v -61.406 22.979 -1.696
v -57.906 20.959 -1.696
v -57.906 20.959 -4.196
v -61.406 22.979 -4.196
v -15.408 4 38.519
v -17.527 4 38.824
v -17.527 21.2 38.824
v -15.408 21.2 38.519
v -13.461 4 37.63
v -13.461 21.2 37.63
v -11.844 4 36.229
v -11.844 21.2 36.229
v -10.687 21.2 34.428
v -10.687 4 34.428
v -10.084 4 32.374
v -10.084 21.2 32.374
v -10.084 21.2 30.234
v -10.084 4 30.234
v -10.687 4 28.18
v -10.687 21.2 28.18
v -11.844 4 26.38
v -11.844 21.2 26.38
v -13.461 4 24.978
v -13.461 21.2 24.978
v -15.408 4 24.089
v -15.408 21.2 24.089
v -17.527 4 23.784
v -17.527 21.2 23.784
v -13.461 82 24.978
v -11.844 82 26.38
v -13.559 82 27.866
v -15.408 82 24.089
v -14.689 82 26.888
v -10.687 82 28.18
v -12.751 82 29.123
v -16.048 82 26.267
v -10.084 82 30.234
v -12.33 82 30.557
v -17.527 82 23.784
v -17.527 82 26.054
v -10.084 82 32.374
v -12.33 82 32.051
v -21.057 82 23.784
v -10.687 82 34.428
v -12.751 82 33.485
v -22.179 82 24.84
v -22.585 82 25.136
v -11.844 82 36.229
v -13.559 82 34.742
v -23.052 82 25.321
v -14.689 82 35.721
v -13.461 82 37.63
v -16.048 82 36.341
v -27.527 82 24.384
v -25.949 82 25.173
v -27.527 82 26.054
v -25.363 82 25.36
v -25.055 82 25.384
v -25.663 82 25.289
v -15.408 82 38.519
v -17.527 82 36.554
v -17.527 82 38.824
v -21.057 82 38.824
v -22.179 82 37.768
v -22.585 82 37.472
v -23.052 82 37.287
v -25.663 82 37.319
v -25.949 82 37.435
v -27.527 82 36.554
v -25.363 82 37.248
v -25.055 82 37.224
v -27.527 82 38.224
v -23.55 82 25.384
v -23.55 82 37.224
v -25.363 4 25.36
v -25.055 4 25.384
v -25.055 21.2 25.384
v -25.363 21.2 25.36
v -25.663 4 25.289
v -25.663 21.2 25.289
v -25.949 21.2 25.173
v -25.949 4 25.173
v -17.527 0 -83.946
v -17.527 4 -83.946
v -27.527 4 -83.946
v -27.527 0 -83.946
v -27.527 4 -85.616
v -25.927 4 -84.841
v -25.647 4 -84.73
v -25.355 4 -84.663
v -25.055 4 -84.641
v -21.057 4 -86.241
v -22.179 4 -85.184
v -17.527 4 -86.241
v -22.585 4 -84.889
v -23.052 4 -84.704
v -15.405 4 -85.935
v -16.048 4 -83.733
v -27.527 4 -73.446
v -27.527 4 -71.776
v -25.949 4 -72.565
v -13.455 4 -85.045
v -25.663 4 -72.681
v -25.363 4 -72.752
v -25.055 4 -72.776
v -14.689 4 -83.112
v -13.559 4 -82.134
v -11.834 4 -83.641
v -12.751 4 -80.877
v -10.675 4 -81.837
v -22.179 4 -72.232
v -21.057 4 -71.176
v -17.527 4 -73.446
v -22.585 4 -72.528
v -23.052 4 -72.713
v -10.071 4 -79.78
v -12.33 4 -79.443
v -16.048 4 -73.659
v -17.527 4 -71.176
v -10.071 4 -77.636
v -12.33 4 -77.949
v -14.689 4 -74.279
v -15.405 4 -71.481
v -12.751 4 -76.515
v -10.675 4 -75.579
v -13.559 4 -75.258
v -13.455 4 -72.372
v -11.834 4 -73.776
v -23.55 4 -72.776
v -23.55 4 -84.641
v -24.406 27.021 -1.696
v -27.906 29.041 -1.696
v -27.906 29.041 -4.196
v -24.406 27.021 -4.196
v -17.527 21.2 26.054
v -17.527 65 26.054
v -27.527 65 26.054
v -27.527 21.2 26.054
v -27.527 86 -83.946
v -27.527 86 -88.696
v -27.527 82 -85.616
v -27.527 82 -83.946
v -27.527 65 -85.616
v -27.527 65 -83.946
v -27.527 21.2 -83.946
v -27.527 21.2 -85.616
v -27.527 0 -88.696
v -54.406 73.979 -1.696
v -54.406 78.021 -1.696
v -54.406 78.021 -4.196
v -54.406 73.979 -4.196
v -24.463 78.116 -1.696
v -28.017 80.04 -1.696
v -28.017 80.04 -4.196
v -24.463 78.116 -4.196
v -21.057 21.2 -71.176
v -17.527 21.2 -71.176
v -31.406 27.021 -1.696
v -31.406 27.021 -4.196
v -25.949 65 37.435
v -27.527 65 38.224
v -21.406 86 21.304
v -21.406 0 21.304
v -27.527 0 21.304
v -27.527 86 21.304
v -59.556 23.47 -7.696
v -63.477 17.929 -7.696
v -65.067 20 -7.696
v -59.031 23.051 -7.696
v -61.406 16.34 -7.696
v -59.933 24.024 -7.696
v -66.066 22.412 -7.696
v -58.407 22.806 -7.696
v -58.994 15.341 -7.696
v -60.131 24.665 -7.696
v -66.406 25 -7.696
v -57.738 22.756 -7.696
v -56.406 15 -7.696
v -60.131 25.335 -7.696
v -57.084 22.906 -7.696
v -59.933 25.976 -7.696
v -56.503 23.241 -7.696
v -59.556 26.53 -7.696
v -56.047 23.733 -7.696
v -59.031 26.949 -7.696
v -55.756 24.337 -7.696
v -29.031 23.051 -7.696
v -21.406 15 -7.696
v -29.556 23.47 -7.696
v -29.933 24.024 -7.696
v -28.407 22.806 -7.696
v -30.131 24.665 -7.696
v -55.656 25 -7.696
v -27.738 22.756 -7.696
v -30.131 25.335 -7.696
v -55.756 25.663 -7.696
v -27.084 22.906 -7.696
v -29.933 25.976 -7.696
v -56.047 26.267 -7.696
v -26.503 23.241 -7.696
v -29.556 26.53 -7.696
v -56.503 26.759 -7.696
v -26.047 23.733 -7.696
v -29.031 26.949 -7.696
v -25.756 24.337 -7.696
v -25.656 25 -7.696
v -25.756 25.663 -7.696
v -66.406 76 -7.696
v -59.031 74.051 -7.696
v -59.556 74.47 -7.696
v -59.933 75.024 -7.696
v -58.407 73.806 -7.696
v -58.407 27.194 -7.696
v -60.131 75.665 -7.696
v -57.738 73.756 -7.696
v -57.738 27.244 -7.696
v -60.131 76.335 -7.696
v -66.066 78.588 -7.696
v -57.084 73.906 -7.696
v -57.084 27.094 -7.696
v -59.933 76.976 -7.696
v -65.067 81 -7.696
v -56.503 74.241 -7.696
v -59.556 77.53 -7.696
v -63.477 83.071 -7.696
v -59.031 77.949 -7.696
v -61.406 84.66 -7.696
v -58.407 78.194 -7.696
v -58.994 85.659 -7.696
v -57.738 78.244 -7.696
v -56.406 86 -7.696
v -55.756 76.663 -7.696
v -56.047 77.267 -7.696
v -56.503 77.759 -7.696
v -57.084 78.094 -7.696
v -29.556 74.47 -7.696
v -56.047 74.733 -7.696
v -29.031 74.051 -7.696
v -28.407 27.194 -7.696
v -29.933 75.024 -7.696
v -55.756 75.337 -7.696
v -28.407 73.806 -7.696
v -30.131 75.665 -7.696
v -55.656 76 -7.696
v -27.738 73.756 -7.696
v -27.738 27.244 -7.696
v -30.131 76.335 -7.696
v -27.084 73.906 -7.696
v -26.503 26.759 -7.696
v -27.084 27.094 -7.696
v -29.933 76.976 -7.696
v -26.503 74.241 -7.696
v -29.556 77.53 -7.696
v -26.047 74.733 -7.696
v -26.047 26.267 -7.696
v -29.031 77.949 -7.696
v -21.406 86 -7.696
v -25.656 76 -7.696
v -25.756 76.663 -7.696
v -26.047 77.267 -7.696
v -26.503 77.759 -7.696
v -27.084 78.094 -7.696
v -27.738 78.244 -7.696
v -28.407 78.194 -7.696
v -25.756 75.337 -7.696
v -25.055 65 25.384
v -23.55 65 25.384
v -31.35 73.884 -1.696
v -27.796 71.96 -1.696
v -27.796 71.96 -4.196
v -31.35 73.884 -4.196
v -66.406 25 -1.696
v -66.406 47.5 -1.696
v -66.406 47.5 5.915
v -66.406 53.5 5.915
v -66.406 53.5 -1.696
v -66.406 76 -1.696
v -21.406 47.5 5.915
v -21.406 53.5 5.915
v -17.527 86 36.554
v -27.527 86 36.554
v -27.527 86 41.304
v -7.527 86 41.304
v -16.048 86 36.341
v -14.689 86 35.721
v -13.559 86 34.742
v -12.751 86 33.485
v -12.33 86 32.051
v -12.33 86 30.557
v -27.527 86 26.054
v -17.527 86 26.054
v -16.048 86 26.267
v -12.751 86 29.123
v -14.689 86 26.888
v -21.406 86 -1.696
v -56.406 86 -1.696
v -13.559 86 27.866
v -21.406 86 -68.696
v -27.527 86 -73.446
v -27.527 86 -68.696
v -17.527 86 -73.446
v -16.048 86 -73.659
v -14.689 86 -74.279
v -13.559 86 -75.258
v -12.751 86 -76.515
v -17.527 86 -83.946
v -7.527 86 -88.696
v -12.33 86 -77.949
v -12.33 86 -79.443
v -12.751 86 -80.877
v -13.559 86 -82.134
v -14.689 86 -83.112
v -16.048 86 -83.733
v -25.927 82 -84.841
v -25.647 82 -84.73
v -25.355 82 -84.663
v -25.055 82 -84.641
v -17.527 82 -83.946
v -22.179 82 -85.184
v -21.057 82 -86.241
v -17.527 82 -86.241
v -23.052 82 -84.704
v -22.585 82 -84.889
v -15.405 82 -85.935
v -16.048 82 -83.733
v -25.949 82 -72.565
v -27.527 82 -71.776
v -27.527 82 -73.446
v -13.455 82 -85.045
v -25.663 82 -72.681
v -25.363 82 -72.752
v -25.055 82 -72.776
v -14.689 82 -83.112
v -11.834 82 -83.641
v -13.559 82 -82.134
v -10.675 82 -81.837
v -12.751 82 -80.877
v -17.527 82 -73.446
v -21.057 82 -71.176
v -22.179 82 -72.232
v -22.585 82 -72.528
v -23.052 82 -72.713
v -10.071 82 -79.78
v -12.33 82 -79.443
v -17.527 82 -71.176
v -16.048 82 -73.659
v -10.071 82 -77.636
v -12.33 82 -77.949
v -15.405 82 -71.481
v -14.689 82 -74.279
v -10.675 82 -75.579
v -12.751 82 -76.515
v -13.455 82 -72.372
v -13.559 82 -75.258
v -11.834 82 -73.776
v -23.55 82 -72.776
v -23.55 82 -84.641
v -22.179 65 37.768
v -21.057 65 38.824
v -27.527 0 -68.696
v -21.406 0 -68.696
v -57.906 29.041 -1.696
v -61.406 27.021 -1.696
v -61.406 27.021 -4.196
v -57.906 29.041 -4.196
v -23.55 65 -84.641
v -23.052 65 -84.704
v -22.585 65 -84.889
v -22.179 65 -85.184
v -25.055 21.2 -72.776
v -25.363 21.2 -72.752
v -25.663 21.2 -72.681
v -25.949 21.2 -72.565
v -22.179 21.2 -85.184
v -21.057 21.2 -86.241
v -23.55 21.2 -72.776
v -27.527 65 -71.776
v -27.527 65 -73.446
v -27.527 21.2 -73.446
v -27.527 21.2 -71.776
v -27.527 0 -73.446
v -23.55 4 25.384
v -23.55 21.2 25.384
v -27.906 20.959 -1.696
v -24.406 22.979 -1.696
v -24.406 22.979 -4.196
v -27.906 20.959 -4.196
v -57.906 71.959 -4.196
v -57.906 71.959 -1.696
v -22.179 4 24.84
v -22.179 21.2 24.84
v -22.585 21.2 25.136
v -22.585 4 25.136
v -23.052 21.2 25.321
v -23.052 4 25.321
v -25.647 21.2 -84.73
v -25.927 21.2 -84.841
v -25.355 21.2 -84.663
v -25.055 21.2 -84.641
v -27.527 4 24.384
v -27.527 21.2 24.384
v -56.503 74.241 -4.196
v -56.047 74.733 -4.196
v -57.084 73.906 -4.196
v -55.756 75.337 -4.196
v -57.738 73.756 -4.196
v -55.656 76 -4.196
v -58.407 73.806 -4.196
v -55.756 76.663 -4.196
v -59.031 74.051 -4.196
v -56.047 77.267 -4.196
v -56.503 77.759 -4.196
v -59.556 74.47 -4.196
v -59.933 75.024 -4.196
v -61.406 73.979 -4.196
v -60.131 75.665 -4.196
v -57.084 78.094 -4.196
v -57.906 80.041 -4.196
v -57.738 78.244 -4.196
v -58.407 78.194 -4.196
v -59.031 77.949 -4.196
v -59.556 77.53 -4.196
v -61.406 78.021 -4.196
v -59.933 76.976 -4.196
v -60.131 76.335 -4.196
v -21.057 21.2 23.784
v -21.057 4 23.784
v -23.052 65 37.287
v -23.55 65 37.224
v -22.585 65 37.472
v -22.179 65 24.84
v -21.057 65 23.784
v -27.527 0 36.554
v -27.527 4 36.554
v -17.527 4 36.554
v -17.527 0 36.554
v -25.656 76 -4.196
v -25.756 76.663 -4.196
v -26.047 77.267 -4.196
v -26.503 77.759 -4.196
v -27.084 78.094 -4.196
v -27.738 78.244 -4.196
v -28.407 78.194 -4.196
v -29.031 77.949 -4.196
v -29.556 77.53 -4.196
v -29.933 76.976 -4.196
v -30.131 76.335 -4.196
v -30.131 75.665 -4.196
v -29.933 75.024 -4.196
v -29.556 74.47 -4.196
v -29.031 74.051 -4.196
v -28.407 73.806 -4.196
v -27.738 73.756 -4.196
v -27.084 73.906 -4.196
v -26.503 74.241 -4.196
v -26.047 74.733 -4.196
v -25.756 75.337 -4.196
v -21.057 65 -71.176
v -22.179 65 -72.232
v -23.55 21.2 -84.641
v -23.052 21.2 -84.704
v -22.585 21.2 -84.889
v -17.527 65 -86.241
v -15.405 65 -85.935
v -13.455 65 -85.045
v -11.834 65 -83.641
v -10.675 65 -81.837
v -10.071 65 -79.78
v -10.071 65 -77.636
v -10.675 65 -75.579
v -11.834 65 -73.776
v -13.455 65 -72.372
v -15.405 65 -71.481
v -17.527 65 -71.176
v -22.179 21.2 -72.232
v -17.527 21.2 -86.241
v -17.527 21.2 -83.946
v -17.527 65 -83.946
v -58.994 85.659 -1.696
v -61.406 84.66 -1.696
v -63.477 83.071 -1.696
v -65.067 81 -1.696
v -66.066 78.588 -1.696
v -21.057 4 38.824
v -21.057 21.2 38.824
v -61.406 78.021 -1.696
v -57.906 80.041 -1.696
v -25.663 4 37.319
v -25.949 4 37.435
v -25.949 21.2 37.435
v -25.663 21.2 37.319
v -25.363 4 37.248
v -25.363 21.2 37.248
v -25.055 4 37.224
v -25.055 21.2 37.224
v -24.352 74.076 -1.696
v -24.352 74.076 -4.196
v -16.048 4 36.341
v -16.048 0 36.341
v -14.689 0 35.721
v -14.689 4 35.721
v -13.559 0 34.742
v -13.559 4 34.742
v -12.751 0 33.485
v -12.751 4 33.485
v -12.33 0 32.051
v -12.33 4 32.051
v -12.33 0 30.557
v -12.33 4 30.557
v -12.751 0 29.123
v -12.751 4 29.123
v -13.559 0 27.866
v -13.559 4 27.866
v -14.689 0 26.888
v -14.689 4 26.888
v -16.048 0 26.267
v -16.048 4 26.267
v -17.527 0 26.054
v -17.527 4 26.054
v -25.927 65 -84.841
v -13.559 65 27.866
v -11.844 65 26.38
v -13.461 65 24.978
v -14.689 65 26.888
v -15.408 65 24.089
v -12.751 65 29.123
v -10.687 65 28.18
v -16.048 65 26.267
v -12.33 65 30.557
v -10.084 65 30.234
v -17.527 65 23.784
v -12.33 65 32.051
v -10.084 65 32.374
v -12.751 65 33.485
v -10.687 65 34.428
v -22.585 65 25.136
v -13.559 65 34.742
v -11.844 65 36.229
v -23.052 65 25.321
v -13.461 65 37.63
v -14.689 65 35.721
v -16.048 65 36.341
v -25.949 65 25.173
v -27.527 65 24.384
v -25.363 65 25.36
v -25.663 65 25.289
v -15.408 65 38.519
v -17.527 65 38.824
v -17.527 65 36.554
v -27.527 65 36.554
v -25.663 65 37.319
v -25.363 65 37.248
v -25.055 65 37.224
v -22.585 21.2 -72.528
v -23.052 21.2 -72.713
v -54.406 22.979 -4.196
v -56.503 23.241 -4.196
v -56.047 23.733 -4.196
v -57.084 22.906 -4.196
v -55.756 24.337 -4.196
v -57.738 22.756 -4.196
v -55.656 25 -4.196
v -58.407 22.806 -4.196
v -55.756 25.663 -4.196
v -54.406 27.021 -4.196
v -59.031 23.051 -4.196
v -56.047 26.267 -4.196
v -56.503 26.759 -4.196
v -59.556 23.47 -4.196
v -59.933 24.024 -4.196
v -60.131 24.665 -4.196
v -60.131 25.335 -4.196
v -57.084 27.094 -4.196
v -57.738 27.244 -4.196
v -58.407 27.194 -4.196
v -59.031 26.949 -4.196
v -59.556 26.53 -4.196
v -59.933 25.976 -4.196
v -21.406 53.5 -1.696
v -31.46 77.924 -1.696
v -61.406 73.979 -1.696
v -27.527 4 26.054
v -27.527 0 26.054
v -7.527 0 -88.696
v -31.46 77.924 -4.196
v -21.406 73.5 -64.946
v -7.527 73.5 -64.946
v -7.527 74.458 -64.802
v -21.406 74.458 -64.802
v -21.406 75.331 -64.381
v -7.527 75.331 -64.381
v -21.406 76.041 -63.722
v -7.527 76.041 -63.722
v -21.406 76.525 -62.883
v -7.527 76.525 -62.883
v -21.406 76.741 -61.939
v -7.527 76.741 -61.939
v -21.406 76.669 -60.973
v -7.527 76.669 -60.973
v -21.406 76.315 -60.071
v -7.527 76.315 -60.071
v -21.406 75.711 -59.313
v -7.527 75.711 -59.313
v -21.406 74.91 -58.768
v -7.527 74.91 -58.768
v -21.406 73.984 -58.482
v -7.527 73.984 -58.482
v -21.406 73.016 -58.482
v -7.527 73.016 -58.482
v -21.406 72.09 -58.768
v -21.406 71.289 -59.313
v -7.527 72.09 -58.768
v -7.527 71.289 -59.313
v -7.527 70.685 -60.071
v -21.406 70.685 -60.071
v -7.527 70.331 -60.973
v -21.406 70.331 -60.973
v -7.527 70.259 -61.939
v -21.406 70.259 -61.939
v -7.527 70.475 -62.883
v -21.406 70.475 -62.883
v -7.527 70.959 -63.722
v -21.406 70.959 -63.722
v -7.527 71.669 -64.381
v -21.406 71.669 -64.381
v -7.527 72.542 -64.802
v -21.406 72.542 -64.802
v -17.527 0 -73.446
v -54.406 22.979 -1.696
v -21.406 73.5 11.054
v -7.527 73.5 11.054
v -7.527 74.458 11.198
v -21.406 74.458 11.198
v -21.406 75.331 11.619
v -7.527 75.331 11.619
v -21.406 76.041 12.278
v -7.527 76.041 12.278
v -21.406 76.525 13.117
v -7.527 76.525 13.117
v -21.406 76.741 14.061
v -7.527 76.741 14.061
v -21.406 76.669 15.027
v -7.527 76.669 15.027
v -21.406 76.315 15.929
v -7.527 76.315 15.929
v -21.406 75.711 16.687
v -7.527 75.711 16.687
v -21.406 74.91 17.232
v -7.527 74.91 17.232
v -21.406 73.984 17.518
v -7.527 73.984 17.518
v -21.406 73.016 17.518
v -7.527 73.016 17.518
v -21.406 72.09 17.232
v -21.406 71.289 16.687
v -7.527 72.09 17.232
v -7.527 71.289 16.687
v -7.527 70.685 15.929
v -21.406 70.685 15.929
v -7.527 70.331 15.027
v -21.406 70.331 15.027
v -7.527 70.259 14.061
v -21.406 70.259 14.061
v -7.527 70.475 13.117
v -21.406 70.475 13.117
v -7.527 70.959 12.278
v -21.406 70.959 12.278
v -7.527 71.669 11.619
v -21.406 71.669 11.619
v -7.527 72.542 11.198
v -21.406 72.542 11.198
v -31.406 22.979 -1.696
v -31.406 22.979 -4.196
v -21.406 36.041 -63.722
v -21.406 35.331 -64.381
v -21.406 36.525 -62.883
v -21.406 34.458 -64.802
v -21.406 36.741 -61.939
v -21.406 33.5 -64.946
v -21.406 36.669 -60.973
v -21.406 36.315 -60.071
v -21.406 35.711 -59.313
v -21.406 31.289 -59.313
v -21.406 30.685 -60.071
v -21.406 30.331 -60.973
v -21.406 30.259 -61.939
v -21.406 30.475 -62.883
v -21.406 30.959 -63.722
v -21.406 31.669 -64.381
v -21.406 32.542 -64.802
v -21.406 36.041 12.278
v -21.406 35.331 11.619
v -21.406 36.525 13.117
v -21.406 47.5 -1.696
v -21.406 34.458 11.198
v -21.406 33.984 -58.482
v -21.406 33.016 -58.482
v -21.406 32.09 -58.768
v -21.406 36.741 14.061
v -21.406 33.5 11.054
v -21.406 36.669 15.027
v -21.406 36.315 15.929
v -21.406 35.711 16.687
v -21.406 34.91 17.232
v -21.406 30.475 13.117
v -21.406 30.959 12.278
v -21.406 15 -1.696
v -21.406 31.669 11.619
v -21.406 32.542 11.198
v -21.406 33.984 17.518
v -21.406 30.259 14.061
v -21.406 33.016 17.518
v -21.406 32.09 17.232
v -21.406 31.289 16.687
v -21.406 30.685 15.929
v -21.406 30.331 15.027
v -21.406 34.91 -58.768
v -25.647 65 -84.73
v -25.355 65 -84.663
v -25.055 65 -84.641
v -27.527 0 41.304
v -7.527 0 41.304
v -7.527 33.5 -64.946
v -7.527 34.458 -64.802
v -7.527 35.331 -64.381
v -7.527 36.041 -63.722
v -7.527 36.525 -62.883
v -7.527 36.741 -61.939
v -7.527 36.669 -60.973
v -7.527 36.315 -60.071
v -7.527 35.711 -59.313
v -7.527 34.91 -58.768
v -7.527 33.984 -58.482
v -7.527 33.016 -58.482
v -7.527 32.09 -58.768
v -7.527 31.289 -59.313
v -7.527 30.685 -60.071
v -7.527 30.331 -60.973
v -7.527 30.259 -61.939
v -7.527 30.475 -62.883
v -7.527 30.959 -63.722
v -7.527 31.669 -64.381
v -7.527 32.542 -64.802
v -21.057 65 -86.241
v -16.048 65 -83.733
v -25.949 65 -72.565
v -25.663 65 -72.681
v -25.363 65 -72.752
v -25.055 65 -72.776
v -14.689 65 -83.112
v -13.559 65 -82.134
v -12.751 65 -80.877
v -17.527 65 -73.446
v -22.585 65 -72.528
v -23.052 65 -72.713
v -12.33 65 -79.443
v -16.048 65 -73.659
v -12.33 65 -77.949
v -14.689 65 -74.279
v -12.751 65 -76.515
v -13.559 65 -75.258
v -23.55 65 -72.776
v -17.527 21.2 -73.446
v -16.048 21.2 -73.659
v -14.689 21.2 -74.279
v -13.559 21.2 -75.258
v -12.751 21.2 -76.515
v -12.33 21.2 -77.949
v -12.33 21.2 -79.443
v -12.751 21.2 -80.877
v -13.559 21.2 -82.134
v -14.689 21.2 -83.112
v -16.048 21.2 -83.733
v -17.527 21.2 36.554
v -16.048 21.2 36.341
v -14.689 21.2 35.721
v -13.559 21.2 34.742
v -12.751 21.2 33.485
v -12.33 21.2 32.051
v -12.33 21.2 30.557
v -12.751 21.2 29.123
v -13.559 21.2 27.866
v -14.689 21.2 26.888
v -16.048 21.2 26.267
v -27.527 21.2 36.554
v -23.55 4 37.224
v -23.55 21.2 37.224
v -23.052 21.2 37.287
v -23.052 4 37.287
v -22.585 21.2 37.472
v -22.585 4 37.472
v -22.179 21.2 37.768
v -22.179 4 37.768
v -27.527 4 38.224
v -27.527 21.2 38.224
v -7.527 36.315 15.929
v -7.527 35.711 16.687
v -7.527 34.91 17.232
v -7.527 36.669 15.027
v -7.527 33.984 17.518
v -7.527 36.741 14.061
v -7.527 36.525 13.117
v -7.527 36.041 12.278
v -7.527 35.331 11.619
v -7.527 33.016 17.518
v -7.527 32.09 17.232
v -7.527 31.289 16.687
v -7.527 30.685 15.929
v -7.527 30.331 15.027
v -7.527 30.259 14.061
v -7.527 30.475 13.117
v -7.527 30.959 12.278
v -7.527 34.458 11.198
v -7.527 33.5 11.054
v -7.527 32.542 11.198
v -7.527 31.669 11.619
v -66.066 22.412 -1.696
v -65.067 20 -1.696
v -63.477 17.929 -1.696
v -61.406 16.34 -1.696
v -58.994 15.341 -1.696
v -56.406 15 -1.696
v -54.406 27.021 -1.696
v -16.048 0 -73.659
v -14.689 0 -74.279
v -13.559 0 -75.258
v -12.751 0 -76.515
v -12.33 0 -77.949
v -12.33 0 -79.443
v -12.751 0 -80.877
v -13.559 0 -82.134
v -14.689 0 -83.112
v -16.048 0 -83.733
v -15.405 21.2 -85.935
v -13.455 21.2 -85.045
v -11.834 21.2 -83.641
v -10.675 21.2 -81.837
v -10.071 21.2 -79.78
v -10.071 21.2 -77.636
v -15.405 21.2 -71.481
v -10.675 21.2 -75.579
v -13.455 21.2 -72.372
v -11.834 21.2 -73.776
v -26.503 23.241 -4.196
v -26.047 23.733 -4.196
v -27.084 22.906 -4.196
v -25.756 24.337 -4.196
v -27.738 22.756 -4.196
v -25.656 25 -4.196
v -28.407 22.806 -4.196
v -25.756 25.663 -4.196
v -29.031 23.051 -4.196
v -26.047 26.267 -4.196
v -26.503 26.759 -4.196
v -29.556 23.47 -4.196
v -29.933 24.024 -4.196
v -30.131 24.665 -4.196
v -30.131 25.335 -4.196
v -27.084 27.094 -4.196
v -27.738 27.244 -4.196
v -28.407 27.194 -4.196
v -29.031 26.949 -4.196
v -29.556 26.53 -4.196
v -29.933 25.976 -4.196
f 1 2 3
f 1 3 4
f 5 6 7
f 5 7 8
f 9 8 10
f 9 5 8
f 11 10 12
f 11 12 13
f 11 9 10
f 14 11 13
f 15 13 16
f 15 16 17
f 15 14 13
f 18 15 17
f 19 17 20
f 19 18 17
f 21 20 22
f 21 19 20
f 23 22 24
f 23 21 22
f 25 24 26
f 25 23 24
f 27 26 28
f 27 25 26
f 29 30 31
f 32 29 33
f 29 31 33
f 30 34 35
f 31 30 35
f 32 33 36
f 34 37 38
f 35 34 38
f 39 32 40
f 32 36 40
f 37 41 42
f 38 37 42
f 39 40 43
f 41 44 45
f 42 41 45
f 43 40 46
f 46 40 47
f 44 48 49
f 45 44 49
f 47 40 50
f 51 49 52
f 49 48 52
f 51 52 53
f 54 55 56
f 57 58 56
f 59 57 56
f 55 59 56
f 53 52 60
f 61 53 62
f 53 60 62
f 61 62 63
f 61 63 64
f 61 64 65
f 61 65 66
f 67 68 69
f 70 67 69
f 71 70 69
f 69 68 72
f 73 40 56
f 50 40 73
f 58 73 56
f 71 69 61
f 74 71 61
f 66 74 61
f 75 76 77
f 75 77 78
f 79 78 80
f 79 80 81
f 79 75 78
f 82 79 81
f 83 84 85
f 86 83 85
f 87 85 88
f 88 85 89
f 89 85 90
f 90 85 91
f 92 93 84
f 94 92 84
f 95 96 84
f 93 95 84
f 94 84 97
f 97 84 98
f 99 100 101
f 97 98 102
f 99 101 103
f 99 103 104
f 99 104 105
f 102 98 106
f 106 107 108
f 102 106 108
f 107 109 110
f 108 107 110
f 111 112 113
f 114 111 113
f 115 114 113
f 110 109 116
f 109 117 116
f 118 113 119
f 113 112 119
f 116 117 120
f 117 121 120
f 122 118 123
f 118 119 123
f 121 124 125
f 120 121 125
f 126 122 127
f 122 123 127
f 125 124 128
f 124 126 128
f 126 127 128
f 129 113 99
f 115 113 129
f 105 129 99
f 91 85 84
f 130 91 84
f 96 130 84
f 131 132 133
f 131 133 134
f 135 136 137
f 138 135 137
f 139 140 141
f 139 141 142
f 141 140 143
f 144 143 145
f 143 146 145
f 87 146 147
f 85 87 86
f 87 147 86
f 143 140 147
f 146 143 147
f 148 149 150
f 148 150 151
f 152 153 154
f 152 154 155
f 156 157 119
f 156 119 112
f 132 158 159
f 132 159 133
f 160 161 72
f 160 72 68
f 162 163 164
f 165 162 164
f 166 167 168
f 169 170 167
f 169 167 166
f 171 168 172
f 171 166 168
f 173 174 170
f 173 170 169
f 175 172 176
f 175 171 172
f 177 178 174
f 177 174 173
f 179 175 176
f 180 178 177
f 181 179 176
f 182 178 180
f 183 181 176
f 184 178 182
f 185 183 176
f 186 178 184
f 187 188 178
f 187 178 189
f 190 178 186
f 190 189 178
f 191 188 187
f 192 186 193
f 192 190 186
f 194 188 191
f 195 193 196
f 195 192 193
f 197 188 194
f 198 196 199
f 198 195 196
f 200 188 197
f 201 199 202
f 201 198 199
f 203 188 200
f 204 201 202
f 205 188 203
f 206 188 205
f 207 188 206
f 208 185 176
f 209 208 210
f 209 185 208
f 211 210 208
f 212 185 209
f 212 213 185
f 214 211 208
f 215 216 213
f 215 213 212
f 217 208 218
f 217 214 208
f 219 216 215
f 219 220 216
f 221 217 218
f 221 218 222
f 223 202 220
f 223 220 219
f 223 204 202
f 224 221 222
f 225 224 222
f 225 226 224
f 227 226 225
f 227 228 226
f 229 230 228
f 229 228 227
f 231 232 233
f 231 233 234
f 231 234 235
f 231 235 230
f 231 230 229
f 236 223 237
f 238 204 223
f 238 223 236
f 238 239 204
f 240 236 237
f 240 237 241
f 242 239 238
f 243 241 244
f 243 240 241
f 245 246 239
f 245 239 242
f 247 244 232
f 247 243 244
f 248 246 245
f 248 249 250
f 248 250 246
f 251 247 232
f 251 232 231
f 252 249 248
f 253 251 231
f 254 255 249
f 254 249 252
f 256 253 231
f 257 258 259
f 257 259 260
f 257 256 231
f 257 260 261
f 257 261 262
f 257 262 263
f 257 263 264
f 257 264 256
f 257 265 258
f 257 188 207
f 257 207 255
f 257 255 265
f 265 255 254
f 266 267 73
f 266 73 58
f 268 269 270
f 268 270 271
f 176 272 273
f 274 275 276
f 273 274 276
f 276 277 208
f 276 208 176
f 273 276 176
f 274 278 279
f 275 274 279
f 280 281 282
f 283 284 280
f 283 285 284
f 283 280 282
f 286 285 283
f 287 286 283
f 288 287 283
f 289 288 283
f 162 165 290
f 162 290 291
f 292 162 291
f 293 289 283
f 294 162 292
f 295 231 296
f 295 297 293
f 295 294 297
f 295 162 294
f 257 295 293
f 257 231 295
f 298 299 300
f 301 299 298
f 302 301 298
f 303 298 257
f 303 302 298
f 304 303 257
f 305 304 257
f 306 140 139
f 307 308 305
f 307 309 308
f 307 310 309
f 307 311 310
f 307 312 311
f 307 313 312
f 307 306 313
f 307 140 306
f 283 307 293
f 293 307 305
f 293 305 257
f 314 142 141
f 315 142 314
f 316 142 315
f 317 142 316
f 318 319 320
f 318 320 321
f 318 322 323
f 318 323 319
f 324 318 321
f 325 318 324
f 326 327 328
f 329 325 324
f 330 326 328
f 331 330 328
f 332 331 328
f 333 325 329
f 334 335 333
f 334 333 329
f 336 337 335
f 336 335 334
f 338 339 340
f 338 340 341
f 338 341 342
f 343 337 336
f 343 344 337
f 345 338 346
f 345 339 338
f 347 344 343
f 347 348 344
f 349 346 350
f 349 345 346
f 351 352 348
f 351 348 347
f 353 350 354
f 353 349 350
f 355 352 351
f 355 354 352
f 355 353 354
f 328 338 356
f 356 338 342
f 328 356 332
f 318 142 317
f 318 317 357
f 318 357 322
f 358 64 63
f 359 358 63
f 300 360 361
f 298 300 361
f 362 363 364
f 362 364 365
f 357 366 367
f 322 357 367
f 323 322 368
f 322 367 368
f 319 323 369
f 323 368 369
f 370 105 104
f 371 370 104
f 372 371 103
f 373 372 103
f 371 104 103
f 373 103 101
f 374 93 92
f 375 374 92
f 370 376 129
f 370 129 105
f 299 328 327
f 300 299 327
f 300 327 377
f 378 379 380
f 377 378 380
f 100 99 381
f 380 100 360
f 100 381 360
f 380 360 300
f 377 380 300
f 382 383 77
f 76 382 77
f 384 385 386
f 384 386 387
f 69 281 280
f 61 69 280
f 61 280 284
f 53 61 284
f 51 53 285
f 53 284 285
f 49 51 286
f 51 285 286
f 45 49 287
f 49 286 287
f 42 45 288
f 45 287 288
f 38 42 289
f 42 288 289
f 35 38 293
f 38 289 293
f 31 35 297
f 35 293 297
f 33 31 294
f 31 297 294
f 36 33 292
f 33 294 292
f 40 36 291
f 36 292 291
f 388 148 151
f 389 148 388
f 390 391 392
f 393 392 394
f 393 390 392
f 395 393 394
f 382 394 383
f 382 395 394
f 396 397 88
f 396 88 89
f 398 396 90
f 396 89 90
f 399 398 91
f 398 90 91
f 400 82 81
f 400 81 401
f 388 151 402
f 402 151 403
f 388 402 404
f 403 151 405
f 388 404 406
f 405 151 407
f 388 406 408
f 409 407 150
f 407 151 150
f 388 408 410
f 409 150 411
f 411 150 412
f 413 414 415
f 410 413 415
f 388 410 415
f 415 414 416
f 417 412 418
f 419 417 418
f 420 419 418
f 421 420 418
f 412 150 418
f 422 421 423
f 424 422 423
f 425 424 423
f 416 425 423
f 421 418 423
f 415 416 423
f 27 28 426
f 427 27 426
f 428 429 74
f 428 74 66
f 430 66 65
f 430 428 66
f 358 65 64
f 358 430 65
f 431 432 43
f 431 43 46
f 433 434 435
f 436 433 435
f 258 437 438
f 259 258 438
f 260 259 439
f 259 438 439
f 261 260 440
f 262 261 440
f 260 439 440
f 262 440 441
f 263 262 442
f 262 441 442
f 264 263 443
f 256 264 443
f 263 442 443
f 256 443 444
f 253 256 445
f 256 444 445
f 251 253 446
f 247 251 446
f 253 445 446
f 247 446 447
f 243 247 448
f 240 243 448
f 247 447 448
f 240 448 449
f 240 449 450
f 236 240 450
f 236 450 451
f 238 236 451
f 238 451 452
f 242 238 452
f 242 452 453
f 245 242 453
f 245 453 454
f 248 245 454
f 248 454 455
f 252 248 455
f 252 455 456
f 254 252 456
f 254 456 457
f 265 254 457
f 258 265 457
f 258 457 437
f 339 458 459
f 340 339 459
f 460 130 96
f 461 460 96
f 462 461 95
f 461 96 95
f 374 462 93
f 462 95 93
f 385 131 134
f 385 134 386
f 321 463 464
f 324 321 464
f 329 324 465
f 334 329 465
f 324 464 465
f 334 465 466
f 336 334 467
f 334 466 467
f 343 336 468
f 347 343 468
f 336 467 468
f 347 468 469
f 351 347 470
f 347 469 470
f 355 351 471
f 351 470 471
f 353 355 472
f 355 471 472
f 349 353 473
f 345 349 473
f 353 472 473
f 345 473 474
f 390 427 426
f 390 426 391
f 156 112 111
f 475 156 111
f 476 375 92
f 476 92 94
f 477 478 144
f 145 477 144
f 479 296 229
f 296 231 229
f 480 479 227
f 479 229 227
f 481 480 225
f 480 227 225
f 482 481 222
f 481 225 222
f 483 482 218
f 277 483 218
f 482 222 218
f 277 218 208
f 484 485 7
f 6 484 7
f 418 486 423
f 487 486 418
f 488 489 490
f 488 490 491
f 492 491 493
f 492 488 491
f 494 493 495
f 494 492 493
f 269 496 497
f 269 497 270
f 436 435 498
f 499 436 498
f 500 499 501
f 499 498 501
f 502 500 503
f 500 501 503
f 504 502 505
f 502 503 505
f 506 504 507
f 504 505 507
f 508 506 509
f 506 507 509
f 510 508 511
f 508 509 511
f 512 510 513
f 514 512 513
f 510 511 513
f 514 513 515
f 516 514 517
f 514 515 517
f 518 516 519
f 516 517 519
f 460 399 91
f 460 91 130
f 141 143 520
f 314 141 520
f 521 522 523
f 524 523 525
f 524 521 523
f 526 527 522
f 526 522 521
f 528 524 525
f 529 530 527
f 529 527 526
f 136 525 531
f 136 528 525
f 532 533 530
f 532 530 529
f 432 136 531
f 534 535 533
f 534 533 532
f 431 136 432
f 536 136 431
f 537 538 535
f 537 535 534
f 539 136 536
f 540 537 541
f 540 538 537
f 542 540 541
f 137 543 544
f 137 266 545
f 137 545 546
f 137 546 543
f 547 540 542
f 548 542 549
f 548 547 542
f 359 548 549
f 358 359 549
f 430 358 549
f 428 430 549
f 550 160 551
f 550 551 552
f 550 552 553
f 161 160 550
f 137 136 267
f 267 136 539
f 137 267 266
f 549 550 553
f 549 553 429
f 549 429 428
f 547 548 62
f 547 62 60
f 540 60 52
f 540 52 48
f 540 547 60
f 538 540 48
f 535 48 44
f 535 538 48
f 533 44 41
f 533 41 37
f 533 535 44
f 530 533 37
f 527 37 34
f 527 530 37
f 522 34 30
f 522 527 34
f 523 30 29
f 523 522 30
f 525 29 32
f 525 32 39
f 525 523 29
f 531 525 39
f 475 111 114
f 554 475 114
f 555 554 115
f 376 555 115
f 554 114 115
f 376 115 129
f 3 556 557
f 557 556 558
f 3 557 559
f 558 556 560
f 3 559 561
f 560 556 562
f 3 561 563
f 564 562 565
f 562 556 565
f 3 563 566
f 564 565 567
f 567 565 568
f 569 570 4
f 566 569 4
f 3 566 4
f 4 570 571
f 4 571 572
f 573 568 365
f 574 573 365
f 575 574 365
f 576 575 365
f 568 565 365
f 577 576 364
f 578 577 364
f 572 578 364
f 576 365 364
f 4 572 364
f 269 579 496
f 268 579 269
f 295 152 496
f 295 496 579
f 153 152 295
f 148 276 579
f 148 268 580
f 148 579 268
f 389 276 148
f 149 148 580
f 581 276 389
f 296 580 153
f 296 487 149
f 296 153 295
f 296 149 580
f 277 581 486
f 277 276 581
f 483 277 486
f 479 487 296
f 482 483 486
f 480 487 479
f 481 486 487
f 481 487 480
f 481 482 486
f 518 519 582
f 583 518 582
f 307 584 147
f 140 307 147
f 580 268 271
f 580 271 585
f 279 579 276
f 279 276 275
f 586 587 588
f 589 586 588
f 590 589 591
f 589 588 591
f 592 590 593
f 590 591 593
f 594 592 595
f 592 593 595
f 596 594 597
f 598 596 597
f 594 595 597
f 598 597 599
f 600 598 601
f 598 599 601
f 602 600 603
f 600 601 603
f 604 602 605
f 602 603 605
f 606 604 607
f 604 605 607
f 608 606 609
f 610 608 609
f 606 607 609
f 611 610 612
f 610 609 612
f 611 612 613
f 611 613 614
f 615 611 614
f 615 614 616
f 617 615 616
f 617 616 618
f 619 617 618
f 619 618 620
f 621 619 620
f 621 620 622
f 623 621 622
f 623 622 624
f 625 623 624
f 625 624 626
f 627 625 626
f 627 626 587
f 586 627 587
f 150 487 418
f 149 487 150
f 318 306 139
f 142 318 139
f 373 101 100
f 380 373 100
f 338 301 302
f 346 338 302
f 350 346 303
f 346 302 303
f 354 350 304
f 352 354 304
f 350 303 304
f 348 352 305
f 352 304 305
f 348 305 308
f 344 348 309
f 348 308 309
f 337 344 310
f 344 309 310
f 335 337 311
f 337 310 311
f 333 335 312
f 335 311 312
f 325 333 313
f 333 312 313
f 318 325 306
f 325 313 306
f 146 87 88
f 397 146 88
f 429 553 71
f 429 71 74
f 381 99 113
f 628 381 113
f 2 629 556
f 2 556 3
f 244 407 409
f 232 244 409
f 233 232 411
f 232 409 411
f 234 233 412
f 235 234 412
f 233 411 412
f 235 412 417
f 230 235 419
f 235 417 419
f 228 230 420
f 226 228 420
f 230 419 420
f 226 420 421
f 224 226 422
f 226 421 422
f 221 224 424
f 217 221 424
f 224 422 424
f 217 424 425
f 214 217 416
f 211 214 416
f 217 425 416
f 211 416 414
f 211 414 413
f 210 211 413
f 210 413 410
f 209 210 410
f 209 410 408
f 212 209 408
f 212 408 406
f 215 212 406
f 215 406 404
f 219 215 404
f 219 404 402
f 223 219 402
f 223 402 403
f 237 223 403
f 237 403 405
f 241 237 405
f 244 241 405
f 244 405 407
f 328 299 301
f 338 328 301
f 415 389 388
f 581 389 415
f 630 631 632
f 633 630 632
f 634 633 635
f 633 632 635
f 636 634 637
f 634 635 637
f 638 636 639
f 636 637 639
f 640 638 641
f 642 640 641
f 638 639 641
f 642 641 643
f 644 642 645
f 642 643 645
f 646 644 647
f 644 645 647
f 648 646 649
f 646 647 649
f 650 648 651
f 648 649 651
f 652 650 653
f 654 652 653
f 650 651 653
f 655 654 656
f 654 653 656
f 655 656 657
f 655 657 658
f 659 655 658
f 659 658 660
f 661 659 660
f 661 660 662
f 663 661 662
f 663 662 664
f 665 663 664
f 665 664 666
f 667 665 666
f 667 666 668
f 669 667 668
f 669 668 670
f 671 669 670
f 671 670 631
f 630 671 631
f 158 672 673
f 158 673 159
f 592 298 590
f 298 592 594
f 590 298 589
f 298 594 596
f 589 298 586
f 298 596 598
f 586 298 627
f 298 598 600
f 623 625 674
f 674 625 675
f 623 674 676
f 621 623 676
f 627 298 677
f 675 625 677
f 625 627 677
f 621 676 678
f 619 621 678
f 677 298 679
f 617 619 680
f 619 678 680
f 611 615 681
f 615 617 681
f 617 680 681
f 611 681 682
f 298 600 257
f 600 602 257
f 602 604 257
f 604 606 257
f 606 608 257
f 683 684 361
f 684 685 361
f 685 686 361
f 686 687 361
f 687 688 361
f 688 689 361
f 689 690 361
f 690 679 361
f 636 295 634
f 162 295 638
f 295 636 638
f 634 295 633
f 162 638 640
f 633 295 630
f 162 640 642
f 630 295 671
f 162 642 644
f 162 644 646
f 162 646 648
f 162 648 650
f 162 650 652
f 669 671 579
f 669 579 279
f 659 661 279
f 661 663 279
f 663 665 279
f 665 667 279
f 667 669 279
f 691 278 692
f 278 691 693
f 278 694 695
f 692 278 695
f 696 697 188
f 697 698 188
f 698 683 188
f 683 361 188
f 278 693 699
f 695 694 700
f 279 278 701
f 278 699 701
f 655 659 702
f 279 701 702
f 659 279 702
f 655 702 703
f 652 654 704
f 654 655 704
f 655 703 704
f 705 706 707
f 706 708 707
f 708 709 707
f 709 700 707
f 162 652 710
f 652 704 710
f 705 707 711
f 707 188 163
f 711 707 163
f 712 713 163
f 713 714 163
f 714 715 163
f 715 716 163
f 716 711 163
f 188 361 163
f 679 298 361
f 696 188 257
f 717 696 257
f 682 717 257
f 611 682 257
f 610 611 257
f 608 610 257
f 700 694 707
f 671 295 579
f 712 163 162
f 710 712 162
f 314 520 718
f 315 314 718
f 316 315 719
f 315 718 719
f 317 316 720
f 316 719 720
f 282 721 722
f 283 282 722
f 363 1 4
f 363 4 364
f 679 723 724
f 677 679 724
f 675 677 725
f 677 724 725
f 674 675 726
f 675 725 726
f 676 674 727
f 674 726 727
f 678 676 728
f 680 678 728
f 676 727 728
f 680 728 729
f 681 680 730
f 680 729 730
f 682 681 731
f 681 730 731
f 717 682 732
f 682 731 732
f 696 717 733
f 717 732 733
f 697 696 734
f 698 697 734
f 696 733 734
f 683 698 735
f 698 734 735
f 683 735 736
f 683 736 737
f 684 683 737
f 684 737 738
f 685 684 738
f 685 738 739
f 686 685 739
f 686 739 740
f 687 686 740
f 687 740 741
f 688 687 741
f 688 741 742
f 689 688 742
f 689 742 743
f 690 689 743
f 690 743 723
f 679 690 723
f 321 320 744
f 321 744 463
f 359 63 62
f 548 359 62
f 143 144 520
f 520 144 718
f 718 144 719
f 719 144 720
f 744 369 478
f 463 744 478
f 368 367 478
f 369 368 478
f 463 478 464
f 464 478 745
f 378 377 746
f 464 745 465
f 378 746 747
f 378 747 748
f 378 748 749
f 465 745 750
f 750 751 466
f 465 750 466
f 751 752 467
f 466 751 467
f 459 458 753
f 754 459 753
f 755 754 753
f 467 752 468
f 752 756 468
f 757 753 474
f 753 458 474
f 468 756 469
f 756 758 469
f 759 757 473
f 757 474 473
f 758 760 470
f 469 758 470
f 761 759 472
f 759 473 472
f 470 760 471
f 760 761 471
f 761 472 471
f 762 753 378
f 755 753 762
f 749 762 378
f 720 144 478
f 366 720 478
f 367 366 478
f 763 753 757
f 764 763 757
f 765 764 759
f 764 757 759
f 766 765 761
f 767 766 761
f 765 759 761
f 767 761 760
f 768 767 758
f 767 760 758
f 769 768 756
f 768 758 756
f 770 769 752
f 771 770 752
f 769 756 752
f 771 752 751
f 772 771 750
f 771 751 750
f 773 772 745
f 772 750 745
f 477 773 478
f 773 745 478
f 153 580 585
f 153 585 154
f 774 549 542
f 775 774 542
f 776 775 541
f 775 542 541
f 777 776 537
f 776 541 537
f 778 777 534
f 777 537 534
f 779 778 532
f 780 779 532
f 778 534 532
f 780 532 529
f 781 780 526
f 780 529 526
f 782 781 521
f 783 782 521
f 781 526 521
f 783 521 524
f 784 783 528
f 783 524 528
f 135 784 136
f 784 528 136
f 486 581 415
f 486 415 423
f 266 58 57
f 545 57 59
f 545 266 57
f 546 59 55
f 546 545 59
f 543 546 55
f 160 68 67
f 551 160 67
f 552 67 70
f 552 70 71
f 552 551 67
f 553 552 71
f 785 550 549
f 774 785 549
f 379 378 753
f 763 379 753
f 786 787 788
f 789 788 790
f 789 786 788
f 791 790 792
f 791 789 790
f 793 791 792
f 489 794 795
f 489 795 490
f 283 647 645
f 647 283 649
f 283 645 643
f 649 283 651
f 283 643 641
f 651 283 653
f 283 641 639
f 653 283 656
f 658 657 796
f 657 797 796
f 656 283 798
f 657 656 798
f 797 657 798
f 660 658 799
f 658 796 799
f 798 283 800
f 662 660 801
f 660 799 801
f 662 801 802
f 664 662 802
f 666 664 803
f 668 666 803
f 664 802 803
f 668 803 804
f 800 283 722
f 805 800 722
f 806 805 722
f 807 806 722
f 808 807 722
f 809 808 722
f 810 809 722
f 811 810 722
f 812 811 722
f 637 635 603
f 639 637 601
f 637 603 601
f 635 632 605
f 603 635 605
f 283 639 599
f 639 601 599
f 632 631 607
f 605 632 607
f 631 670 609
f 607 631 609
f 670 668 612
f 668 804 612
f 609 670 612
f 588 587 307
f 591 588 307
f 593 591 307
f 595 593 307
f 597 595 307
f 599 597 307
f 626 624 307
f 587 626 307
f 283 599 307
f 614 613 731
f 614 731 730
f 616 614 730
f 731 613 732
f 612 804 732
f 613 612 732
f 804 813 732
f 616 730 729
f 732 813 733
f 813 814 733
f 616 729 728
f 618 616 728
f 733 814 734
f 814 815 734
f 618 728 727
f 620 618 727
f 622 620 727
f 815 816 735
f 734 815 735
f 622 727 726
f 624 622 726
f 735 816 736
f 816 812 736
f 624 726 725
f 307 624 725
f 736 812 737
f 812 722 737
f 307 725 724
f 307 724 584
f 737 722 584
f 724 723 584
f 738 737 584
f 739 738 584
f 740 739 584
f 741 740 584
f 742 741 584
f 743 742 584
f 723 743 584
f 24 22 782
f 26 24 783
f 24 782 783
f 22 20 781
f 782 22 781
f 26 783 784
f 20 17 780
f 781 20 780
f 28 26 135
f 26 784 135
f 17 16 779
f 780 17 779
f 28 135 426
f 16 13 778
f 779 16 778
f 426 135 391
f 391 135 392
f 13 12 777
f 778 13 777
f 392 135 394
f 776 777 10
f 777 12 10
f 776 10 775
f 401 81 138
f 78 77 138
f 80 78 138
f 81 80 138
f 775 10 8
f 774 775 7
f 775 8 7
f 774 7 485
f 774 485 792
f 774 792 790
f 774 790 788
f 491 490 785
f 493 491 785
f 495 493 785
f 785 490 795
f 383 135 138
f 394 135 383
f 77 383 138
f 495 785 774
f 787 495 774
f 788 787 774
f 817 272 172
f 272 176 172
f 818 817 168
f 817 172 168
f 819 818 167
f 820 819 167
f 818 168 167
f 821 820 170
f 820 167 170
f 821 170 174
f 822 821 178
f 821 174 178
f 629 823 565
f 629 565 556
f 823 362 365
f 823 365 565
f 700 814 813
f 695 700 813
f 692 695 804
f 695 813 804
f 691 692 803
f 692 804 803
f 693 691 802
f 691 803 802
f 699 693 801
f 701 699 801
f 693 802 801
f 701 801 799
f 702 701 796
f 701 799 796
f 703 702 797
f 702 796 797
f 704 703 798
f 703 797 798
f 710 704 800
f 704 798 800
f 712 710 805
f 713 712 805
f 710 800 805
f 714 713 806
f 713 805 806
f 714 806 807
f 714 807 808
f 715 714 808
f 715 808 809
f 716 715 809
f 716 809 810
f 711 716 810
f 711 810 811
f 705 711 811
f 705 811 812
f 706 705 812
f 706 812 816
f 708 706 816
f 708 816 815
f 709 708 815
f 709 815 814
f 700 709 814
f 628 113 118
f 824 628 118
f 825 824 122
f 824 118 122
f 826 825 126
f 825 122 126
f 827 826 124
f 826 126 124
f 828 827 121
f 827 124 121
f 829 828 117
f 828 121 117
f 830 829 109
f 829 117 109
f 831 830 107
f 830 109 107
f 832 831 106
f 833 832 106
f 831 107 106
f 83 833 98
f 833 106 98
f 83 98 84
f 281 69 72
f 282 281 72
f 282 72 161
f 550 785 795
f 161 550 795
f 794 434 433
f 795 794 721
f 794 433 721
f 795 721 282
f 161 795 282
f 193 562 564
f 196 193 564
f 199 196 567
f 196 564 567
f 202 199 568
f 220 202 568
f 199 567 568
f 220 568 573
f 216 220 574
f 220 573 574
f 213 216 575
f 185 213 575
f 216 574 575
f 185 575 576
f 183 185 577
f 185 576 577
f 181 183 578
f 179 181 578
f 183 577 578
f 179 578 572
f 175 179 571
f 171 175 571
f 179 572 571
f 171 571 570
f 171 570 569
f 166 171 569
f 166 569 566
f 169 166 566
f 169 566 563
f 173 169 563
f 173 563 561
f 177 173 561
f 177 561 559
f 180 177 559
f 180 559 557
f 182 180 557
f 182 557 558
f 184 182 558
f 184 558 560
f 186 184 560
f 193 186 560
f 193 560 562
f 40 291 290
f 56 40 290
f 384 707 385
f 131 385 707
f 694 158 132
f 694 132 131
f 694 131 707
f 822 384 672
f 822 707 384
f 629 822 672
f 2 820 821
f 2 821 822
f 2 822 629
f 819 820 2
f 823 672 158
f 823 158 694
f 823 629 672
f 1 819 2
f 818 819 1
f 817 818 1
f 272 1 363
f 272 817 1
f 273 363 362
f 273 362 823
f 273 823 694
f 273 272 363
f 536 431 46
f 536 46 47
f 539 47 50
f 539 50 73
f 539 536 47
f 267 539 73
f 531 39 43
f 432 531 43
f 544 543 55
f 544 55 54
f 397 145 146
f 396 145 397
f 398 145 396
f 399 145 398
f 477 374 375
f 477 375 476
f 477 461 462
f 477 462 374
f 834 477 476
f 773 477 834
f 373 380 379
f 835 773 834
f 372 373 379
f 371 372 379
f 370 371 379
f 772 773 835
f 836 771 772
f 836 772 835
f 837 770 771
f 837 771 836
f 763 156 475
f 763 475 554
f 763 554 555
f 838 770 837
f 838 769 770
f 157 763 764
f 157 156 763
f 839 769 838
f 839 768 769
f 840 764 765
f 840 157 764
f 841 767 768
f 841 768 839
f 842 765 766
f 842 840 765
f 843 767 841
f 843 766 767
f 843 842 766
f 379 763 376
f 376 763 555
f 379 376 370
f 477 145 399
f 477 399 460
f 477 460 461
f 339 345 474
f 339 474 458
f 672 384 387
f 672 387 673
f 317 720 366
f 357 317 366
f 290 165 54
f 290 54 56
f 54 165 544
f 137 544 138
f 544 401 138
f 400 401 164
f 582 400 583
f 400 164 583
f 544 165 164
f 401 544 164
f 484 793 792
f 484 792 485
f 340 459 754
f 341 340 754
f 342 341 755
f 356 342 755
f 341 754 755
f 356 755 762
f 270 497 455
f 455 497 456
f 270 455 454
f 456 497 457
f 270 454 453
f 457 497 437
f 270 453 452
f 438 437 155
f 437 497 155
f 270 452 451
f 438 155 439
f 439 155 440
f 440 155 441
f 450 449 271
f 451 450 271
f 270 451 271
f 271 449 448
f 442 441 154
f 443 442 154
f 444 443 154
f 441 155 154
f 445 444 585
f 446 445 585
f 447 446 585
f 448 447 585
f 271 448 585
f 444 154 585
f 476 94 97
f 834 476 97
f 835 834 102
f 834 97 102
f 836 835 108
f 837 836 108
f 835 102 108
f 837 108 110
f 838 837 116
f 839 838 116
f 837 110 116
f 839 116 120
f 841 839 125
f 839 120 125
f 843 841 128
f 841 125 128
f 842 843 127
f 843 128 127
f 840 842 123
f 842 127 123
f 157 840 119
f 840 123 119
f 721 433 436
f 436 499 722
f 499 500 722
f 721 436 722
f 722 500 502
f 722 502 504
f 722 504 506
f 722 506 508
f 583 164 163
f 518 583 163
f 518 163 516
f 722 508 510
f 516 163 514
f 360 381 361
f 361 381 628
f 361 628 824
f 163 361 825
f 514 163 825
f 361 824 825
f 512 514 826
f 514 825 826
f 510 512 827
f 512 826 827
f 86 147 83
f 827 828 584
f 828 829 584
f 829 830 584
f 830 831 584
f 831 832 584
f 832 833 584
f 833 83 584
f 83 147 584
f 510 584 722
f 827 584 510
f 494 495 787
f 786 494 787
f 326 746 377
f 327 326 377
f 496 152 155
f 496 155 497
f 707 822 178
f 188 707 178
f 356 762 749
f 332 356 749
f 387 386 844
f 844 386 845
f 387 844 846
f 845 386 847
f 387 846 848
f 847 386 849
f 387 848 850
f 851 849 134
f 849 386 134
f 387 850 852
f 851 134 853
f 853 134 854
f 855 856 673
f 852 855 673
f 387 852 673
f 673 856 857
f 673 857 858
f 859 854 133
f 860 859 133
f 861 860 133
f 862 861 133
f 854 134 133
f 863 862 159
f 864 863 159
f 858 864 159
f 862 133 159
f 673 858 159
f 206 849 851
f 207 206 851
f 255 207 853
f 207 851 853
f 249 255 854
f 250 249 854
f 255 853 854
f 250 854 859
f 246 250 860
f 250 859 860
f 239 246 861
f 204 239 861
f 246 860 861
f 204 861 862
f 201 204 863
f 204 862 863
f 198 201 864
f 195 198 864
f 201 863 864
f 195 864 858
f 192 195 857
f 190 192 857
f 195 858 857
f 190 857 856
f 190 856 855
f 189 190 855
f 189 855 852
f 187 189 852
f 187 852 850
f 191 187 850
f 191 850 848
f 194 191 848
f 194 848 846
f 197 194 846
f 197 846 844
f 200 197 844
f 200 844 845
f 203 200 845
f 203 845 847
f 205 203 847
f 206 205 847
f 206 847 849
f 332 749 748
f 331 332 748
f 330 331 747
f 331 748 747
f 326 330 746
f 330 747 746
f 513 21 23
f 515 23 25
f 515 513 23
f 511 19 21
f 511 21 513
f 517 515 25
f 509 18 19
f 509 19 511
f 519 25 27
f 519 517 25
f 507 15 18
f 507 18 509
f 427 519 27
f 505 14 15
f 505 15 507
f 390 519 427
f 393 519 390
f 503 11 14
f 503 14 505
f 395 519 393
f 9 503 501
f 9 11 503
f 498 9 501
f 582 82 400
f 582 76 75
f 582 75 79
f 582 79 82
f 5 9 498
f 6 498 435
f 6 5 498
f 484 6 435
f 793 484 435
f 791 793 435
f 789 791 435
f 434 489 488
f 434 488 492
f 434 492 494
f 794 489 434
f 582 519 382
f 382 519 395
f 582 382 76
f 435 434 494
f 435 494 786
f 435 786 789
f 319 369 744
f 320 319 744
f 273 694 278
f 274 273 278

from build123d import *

# Parameters (mm, degrees)
BOSS_EXTRUDE1_DEPTH = 86
CUT_EXTRUDE1_REACH  = 88
CUT_EXTRUDE2_START  = -4
CUT_EXTRUDE2_DEPTH  = 17.2
CUT_EXTRUDE3_START  = -65
CUT_EXTRUDE3_DEPTH  = 17
SKETCH5_W           = 12
SKETCH5_H           = 71
BOSS_EXTRUDE2_DEPTH = 45
SKETCH6_W           = 6
SKETCH6_H           = 71
CUT_EXTRUDE4_DEPTH  = 45
CUT_EXTRUDE6_REACH  = 89
SKETCH8_R           = 2.25
SKETCH9_R           = 3.25
CUT_EXTRUDE7_DEPTH  = 59.8792938
CUT_EXTRUDE8_START  = -6
CUT_EXTRUDE8_DEPTH  = 2.5
FILLET1_R           = 10
SKETCH11_W          = 7.611163598
SKETCH11_H          = 6
BOSS_EXTRUDE3_DEPTH = 45


with BuildPart() as part:
    # Sketch1 → Boss-Extrude1 (new body)
    with BuildSketch(Plane(origin=(0, 0, 0), x_dir=(1, 0, 0), z_dir=(0, 1, 0))):
        Polygon((-7.52701042, -41.304091879), (-7.52701042, 88.695908121), (-27.52701042, 88.695908121), (-27.52701042, 68.695908121), (-21.40630422, 68.695908121), (-21.40630422, -21.304091879), (-27.52701042, -21.304091879), (-27.52701042, -41.304091879), align=None)
    extrude(amount=BOSS_EXTRUDE1_DEPTH)

    # Sketch2 → Cut-Extrude1 (cut, up to next)
    with BuildSketch(Plane(origin=(0, 86, 0), x_dir=(1, 0, 0), z_dir=(0, 1, 0)), mode=Mode.PRIVATE) as cut_extrude1_sk1:
        with BuildLine():
            Line((-17.52701042, 83.945908121), (-27.52701042, 83.945908121))
            Line((-27.52701042, 83.945908121), (-27.52701042, 73.445908121))
            Line((-27.52701042, 73.445908121), (-17.52701042, 73.445908121))
            ThreePointArc((-17.52701042, 73.445908121), (-12.27701042, 78.695908121), (-17.52701042, 83.945908121))
        make_face()
    cut_extrude1_tool1 = extrude(cut_extrude1_sk1.sketch, amount=-CUT_EXTRUDE1_REACH, mode=Mode.PRIVATE) & part.part
    add(cut_extrude1_tool1.solids().sort_by_distance((-20.41673, 86, -78.695908))[0], mode=Mode.SUBTRACT)
    # Sketch2 → Cut-Extrude1 (cut, up to next)
    with BuildSketch(Plane(origin=(0, 86, 0), x_dir=(1, 0, 0), z_dir=(0, 1, 0)), mode=Mode.PRIVATE) as cut_extrude1_sk2:
        with BuildLine():
            Line((-17.52701042, -26.054091879), (-27.52701042, -26.054091879))
            Line((-27.52701042, -26.054091879), (-27.52701042, -36.554091879))
            Line((-27.52701042, -36.554091879), (-17.52701042, -36.554091879))
            ThreePointArc((-17.52701042, -36.554091879), (-12.27701042, -31.304091879), (-17.52701042, -26.054091879))
        make_face()
    cut_extrude1_tool2 = extrude(cut_extrude1_sk2.sketch, amount=-CUT_EXTRUDE1_REACH, mode=Mode.PRIVATE) & part.part
    add(cut_extrude1_tool2.solids().sort_by_distance((-20.41673, 86, 31.304092))[0], mode=Mode.SUBTRACT)

    # Sketch4 → Cut-Extrude2 (cut)
    with BuildSketch(Plane.XZ.offset(CUT_EXTRUDE2_START)):
        with BuildLine():
            Line((-27.52701042, 24.384091879), (-27.52701042, 38.224091879))
            Line((-27.52701042, 38.224091879), (-25.949301656, 37.435237497))
            ThreePointArc((-25.949301656, 37.435237497), (-25.514380306, 37.2775939), (-25.054874465, 37.224091879))
            Line((-25.054874465, 37.224091879), (-23.550164803, 37.224091879))
            ThreePointArc((-23.550164803, 37.224091879), (-22.812872449, 37.364952297), (-22.179435405, 37.767691894))
            Line((-22.179435405, 37.767691894), (-21.05701042, 38.824091879))
            Line((-21.05701042, 38.824091879), (-17.52701042, 38.824091879))
            ThreePointArc((-17.52701042, 38.824091879), (-10.00701042, 31.304091879), (-17.52701042, 23.784091879))
            Line((-17.52701042, 23.784091879), (-21.05701042, 23.784091879))
            Line((-21.05701042, 23.784091879), (-22.179435405, 24.840491864))
            ThreePointArc((-22.179435405, 24.840491864), (-22.812872449, 25.243231461), (-23.550164803, 25.384091879))
            Line((-23.550164803, 25.384091879), (-25.054874465, 25.384091879))
            ThreePointArc((-25.054874465, 25.384091879), (-25.514380306, 25.330589858), (-25.949301656, 25.172946261))
            Line((-25.949301656, 25.172946261), (-27.52701042, 24.384091879))
        make_face()
        with BuildLine():
            Line((-21.05701042, -86.240594633), (-17.52701042, -86.240594633))
            ThreePointArc((-17.52701042, -86.240594633), (-9.994667164, -78.708251377), (-17.52701042, -71.175908121))
            Line((-17.52701042, -71.175908121), (-21.05701042, -71.175908121))
            Line((-21.05701042, -71.175908121), (-22.179435405, -72.232308106))
            ThreePointArc((-22.179435405, -72.232308106), (-22.812872449, -72.635047703), (-23.550164803, -72.775908121))
            Line((-23.550164803, -72.775908121), (-25.054874465, -72.775908121))
            ThreePointArc((-25.054874465, -72.775908121), (-25.514380306, -72.7224061), (-25.949301656, -72.564762503))
            Line((-25.949301656, -72.564762503), (-27.52701042, -71.775908121))
            Line((-27.52701042, -71.775908121), (-27.52701042, -85.615908121))
            Line((-27.52701042, -85.615908121), (-25.926859801, -84.840694199))
            ThreePointArc((-25.926859801, -84.840694199), (-25.502199364, -84.691261302), (-25.054874465, -84.640594633))
            Line((-25.054874465, -84.640594633), (-23.550164803, -84.640594633))
            ThreePointArc((-23.550164803, -84.640594633), (-22.812872449, -84.781455051), (-22.179435405, -85.184194648))
            Line((-22.179435405, -85.184194648), (-21.05701042, -86.240594633))
        make_face()
    extrude(amount=-CUT_EXTRUDE2_DEPTH, mode=Mode.SUBTRACT)

    # Sketch4<2> → Cut-Extrude3 (cut)
    with BuildSketch(Plane.XZ.offset(CUT_EXTRUDE3_START)):
        with BuildLine():
            Line((-27.52701042, 24.384091879), (-27.52701042, 38.224091879))
            Line((-27.52701042, 38.224091879), (-25.949301656, 37.435237497))
            ThreePointArc((-25.949301656, 37.435237497), (-25.514380306, 37.2775939), (-25.054874465, 37.224091879))
            Line((-25.054874465, 37.224091879), (-23.550164803, 37.224091879))
            ThreePointArc((-23.550164803, 37.224091879), (-22.812872449, 37.364952297), (-22.179435405, 37.767691894))
            Line((-22.179435405, 37.767691894), (-21.05701042, 38.824091879))
            Line((-21.05701042, 38.824091879), (-17.52701042, 38.824091879))
            ThreePointArc((-17.52701042, 38.824091879), (-10.00701042, 31.304091879), (-17.52701042, 23.784091879))
            Line((-17.52701042, 23.784091879), (-21.05701042, 23.784091879))
            Line((-21.05701042, 23.784091879), (-22.179435405, 24.840491864))
            ThreePointArc((-22.179435405, 24.840491864), (-22.812872449, 25.243231461), (-23.550164803, 25.384091879))
            Line((-23.550164803, 25.384091879), (-25.054874465, 25.384091879))
            ThreePointArc((-25.054874465, 25.384091879), (-25.514380306, 25.330589858), (-25.949301656, 25.172946261))
            Line((-25.949301656, 25.172946261), (-27.52701042, 24.384091879))
        make_face()
        with BuildLine():
            Line((-21.05701042, -86.240594633), (-17.52701042, -86.240594633))
            ThreePointArc((-17.52701042, -86.240594633), (-9.994667164, -78.708251377), (-17.52701042, -71.175908121))
            Line((-17.52701042, -71.175908121), (-21.05701042, -71.175908121))
            Line((-21.05701042, -71.175908121), (-22.179435405, -72.232308106))
            ThreePointArc((-22.179435405, -72.232308106), (-22.812872449, -72.635047703), (-23.550164803, -72.775908121))
            Line((-23.550164803, -72.775908121), (-25.054874465, -72.775908121))
            ThreePointArc((-25.054874465, -72.775908121), (-25.514380306, -72.7224061), (-25.949301656, -72.564762503))
            Line((-25.949301656, -72.564762503), (-27.52701042, -71.775908121))
            Line((-27.52701042, -71.775908121), (-27.52701042, -85.615908121))
            Line((-27.52701042, -85.615908121), (-25.926859801, -84.840694199))
            ThreePointArc((-25.926859801, -84.840694199), (-25.502199364, -84.691261302), (-25.054874465, -84.640594633))
            Line((-25.054874465, -84.640594633), (-23.550164803, -84.640594633))
            ThreePointArc((-23.550164803, -84.640594633), (-22.812872449, -84.781455051), (-22.179435405, -85.184194648))
            Line((-22.179435405, -85.184194648), (-21.05701042, -86.240594633))
        make_face()
    extrude(amount=-CUT_EXTRUDE3_DEPTH, mode=Mode.SUBTRACT)

    # Sketch5 → Boss-Extrude2 (add)
    with BuildSketch(Plane(origin=(-21.40630422, 0, 0), x_dir=(0, 0, -1), z_dir=(1, 0, 0))):
        with Locations((1.695908121, 50.5)):
            Rectangle(SKETCH5_W, SKETCH5_H)
    extrude(amount=-BOSS_EXTRUDE2_DEPTH)

    # Sketch6 → Cut-Extrude4 (cut)
    with BuildSketch(Plane.ZY.offset(66.40630422)):
        with Locations((1.304091879, 50.5)):
            Rectangle(SKETCH6_W, SKETCH6_H)
    extrude(amount=-CUT_EXTRUDE4_DEPTH, mode=Mode.SUBTRACT)

    # Sketch8 → Cut-Extrude6 (cut, up to next)
    with BuildSketch(Plane.XY.offset(-1.695908121), mode=Mode.PRIVATE) as cut_extrude6_sk1:
        with Locations((-57.90630422, 25)):
            Circle(SKETCH8_R)
    cut_extrude6_tool1 = extrude(cut_extrude6_sk1.sketch, amount=-CUT_EXTRUDE6_REACH, mode=Mode.PRIVATE) & part.part
    add(cut_extrude6_tool1.solids().sort_by_distance((-57.906304, 25, -1.695908))[0], mode=Mode.SUBTRACT)
    # Sketch8 → Cut-Extrude6 (cut, up to next)
    with BuildSketch(Plane.XY.offset(-1.695908121), mode=Mode.PRIVATE) as cut_extrude6_sk2:
        with Locations((-57.90630422, 76)):
            Circle(SKETCH8_R)
    cut_extrude6_tool2 = extrude(cut_extrude6_sk2.sketch, amount=-CUT_EXTRUDE6_REACH, mode=Mode.PRIVATE) & part.part
    add(cut_extrude6_tool2.solids().sort_by_distance((-57.906304, 76, -1.695908))[0], mode=Mode.SUBTRACT)
    # Sketch8 → Cut-Extrude6 (cut, up to next)
    with BuildSketch(Plane.XY.offset(-1.695908121), mode=Mode.PRIVATE) as cut_extrude6_sk3:
        with Locations((-27.90630422, 25)):
            Circle(SKETCH8_R)
    cut_extrude6_tool3 = extrude(cut_extrude6_sk3.sketch, amount=-CUT_EXTRUDE6_REACH, mode=Mode.PRIVATE) & part.part
    add(cut_extrude6_tool3.solids().sort_by_distance((-27.906304, 25, -1.695908))[0], mode=Mode.SUBTRACT)
    # Sketch8 → Cut-Extrude6 (cut, up to next)
    with BuildSketch(Plane.XY.offset(-1.695908121), mode=Mode.PRIVATE) as cut_extrude6_sk4:
        with Locations((-27.90630422, 76)):
            Circle(SKETCH8_R)
    cut_extrude6_tool4 = extrude(cut_extrude6_sk4.sketch, amount=-CUT_EXTRUDE6_REACH, mode=Mode.PRIVATE) & part.part
    add(cut_extrude6_tool4.solids().sort_by_distance((-27.906304, 76, -1.695908))[0], mode=Mode.SUBTRACT)

    # Sketch9 → Cut-Extrude7 (cut, through all)
    with BuildSketch(Plane(origin=(-7.52701042, 0, 0), x_dir=(0, 0, -1), z_dir=(1, 0, 0))):
        with Locations((61.695908121, 33.5)):
            Circle(SKETCH9_R)
        with Locations((-14.304091879, 33.5)):
            Circle(SKETCH9_R)
        with Locations((-14.304091879, 73.5)):
            Circle(SKETCH9_R)
        with Locations((61.695908121, 73.5)):
            Circle(SKETCH9_R)
    extrude(amount=-CUT_EXTRUDE7_DEPTH, mode=Mode.SUBTRACT)

    # Sketch10 → Cut-Extrude8 (cut)
    with BuildSketch(Plane(origin=(0, 0, -7.695908121), x_dir=(-1, 0, 0), z_dir=(0, 0, -1)).offset(CUT_EXTRUDE8_START)):
        Polygon((61.40630422, 27.020725942), (57.90630422, 29.041451884), (54.40630422, 27.020725942), (54.40630422, 22.979274058), (57.90630422, 20.958548116), (61.40630422, 22.979274058), align=None)
        Polygon((61.40630422, 78.020725942), (57.90630422, 80.041451884), (54.40630422, 78.020725942), (54.40630422, 73.979274058), (57.90630422, 71.958548116), (61.40630422, 73.979274058), align=None)
        Polygon((24.40630422, 22.979274058), (27.90630422, 20.958548116), (31.40630422, 22.979274058), (31.40630422, 27.020725942), (27.90630422, 29.041451884), (24.40630422, 27.020725942), align=None)
        Polygon((27.795986428, 71.960054045), (31.349841151, 73.884489013), (31.460158942, 77.924434968), (28.016622011, 80.039945955), (24.462767289, 78.115510987), (24.352449497, 74.075565032), align=None)
    extrude(amount=CUT_EXTRUDE8_DEPTH, mode=Mode.SUBTRACT)

    # Fillet1
    fillet1_edges = [part.edges().sort_by_distance(p)[0] for p in [
        (-66.40630422, 86, -4.695908121),
        (-66.40630422, 15, -4.695908121),
    ]]
    fillet(fillet1_edges, radius=FILLET1_R)

    # Sketch11 → Boss-Extrude3 (add)
    with BuildSketch(Plane.ZY.offset(21.40630422)):
        with Locations((2.109673678, 50.5)):
            Rectangle(SKETCH11_W, SKETCH11_H)
    extrude(amount=BOSS_EXTRUDE3_DEPTH)


solid = part.part
